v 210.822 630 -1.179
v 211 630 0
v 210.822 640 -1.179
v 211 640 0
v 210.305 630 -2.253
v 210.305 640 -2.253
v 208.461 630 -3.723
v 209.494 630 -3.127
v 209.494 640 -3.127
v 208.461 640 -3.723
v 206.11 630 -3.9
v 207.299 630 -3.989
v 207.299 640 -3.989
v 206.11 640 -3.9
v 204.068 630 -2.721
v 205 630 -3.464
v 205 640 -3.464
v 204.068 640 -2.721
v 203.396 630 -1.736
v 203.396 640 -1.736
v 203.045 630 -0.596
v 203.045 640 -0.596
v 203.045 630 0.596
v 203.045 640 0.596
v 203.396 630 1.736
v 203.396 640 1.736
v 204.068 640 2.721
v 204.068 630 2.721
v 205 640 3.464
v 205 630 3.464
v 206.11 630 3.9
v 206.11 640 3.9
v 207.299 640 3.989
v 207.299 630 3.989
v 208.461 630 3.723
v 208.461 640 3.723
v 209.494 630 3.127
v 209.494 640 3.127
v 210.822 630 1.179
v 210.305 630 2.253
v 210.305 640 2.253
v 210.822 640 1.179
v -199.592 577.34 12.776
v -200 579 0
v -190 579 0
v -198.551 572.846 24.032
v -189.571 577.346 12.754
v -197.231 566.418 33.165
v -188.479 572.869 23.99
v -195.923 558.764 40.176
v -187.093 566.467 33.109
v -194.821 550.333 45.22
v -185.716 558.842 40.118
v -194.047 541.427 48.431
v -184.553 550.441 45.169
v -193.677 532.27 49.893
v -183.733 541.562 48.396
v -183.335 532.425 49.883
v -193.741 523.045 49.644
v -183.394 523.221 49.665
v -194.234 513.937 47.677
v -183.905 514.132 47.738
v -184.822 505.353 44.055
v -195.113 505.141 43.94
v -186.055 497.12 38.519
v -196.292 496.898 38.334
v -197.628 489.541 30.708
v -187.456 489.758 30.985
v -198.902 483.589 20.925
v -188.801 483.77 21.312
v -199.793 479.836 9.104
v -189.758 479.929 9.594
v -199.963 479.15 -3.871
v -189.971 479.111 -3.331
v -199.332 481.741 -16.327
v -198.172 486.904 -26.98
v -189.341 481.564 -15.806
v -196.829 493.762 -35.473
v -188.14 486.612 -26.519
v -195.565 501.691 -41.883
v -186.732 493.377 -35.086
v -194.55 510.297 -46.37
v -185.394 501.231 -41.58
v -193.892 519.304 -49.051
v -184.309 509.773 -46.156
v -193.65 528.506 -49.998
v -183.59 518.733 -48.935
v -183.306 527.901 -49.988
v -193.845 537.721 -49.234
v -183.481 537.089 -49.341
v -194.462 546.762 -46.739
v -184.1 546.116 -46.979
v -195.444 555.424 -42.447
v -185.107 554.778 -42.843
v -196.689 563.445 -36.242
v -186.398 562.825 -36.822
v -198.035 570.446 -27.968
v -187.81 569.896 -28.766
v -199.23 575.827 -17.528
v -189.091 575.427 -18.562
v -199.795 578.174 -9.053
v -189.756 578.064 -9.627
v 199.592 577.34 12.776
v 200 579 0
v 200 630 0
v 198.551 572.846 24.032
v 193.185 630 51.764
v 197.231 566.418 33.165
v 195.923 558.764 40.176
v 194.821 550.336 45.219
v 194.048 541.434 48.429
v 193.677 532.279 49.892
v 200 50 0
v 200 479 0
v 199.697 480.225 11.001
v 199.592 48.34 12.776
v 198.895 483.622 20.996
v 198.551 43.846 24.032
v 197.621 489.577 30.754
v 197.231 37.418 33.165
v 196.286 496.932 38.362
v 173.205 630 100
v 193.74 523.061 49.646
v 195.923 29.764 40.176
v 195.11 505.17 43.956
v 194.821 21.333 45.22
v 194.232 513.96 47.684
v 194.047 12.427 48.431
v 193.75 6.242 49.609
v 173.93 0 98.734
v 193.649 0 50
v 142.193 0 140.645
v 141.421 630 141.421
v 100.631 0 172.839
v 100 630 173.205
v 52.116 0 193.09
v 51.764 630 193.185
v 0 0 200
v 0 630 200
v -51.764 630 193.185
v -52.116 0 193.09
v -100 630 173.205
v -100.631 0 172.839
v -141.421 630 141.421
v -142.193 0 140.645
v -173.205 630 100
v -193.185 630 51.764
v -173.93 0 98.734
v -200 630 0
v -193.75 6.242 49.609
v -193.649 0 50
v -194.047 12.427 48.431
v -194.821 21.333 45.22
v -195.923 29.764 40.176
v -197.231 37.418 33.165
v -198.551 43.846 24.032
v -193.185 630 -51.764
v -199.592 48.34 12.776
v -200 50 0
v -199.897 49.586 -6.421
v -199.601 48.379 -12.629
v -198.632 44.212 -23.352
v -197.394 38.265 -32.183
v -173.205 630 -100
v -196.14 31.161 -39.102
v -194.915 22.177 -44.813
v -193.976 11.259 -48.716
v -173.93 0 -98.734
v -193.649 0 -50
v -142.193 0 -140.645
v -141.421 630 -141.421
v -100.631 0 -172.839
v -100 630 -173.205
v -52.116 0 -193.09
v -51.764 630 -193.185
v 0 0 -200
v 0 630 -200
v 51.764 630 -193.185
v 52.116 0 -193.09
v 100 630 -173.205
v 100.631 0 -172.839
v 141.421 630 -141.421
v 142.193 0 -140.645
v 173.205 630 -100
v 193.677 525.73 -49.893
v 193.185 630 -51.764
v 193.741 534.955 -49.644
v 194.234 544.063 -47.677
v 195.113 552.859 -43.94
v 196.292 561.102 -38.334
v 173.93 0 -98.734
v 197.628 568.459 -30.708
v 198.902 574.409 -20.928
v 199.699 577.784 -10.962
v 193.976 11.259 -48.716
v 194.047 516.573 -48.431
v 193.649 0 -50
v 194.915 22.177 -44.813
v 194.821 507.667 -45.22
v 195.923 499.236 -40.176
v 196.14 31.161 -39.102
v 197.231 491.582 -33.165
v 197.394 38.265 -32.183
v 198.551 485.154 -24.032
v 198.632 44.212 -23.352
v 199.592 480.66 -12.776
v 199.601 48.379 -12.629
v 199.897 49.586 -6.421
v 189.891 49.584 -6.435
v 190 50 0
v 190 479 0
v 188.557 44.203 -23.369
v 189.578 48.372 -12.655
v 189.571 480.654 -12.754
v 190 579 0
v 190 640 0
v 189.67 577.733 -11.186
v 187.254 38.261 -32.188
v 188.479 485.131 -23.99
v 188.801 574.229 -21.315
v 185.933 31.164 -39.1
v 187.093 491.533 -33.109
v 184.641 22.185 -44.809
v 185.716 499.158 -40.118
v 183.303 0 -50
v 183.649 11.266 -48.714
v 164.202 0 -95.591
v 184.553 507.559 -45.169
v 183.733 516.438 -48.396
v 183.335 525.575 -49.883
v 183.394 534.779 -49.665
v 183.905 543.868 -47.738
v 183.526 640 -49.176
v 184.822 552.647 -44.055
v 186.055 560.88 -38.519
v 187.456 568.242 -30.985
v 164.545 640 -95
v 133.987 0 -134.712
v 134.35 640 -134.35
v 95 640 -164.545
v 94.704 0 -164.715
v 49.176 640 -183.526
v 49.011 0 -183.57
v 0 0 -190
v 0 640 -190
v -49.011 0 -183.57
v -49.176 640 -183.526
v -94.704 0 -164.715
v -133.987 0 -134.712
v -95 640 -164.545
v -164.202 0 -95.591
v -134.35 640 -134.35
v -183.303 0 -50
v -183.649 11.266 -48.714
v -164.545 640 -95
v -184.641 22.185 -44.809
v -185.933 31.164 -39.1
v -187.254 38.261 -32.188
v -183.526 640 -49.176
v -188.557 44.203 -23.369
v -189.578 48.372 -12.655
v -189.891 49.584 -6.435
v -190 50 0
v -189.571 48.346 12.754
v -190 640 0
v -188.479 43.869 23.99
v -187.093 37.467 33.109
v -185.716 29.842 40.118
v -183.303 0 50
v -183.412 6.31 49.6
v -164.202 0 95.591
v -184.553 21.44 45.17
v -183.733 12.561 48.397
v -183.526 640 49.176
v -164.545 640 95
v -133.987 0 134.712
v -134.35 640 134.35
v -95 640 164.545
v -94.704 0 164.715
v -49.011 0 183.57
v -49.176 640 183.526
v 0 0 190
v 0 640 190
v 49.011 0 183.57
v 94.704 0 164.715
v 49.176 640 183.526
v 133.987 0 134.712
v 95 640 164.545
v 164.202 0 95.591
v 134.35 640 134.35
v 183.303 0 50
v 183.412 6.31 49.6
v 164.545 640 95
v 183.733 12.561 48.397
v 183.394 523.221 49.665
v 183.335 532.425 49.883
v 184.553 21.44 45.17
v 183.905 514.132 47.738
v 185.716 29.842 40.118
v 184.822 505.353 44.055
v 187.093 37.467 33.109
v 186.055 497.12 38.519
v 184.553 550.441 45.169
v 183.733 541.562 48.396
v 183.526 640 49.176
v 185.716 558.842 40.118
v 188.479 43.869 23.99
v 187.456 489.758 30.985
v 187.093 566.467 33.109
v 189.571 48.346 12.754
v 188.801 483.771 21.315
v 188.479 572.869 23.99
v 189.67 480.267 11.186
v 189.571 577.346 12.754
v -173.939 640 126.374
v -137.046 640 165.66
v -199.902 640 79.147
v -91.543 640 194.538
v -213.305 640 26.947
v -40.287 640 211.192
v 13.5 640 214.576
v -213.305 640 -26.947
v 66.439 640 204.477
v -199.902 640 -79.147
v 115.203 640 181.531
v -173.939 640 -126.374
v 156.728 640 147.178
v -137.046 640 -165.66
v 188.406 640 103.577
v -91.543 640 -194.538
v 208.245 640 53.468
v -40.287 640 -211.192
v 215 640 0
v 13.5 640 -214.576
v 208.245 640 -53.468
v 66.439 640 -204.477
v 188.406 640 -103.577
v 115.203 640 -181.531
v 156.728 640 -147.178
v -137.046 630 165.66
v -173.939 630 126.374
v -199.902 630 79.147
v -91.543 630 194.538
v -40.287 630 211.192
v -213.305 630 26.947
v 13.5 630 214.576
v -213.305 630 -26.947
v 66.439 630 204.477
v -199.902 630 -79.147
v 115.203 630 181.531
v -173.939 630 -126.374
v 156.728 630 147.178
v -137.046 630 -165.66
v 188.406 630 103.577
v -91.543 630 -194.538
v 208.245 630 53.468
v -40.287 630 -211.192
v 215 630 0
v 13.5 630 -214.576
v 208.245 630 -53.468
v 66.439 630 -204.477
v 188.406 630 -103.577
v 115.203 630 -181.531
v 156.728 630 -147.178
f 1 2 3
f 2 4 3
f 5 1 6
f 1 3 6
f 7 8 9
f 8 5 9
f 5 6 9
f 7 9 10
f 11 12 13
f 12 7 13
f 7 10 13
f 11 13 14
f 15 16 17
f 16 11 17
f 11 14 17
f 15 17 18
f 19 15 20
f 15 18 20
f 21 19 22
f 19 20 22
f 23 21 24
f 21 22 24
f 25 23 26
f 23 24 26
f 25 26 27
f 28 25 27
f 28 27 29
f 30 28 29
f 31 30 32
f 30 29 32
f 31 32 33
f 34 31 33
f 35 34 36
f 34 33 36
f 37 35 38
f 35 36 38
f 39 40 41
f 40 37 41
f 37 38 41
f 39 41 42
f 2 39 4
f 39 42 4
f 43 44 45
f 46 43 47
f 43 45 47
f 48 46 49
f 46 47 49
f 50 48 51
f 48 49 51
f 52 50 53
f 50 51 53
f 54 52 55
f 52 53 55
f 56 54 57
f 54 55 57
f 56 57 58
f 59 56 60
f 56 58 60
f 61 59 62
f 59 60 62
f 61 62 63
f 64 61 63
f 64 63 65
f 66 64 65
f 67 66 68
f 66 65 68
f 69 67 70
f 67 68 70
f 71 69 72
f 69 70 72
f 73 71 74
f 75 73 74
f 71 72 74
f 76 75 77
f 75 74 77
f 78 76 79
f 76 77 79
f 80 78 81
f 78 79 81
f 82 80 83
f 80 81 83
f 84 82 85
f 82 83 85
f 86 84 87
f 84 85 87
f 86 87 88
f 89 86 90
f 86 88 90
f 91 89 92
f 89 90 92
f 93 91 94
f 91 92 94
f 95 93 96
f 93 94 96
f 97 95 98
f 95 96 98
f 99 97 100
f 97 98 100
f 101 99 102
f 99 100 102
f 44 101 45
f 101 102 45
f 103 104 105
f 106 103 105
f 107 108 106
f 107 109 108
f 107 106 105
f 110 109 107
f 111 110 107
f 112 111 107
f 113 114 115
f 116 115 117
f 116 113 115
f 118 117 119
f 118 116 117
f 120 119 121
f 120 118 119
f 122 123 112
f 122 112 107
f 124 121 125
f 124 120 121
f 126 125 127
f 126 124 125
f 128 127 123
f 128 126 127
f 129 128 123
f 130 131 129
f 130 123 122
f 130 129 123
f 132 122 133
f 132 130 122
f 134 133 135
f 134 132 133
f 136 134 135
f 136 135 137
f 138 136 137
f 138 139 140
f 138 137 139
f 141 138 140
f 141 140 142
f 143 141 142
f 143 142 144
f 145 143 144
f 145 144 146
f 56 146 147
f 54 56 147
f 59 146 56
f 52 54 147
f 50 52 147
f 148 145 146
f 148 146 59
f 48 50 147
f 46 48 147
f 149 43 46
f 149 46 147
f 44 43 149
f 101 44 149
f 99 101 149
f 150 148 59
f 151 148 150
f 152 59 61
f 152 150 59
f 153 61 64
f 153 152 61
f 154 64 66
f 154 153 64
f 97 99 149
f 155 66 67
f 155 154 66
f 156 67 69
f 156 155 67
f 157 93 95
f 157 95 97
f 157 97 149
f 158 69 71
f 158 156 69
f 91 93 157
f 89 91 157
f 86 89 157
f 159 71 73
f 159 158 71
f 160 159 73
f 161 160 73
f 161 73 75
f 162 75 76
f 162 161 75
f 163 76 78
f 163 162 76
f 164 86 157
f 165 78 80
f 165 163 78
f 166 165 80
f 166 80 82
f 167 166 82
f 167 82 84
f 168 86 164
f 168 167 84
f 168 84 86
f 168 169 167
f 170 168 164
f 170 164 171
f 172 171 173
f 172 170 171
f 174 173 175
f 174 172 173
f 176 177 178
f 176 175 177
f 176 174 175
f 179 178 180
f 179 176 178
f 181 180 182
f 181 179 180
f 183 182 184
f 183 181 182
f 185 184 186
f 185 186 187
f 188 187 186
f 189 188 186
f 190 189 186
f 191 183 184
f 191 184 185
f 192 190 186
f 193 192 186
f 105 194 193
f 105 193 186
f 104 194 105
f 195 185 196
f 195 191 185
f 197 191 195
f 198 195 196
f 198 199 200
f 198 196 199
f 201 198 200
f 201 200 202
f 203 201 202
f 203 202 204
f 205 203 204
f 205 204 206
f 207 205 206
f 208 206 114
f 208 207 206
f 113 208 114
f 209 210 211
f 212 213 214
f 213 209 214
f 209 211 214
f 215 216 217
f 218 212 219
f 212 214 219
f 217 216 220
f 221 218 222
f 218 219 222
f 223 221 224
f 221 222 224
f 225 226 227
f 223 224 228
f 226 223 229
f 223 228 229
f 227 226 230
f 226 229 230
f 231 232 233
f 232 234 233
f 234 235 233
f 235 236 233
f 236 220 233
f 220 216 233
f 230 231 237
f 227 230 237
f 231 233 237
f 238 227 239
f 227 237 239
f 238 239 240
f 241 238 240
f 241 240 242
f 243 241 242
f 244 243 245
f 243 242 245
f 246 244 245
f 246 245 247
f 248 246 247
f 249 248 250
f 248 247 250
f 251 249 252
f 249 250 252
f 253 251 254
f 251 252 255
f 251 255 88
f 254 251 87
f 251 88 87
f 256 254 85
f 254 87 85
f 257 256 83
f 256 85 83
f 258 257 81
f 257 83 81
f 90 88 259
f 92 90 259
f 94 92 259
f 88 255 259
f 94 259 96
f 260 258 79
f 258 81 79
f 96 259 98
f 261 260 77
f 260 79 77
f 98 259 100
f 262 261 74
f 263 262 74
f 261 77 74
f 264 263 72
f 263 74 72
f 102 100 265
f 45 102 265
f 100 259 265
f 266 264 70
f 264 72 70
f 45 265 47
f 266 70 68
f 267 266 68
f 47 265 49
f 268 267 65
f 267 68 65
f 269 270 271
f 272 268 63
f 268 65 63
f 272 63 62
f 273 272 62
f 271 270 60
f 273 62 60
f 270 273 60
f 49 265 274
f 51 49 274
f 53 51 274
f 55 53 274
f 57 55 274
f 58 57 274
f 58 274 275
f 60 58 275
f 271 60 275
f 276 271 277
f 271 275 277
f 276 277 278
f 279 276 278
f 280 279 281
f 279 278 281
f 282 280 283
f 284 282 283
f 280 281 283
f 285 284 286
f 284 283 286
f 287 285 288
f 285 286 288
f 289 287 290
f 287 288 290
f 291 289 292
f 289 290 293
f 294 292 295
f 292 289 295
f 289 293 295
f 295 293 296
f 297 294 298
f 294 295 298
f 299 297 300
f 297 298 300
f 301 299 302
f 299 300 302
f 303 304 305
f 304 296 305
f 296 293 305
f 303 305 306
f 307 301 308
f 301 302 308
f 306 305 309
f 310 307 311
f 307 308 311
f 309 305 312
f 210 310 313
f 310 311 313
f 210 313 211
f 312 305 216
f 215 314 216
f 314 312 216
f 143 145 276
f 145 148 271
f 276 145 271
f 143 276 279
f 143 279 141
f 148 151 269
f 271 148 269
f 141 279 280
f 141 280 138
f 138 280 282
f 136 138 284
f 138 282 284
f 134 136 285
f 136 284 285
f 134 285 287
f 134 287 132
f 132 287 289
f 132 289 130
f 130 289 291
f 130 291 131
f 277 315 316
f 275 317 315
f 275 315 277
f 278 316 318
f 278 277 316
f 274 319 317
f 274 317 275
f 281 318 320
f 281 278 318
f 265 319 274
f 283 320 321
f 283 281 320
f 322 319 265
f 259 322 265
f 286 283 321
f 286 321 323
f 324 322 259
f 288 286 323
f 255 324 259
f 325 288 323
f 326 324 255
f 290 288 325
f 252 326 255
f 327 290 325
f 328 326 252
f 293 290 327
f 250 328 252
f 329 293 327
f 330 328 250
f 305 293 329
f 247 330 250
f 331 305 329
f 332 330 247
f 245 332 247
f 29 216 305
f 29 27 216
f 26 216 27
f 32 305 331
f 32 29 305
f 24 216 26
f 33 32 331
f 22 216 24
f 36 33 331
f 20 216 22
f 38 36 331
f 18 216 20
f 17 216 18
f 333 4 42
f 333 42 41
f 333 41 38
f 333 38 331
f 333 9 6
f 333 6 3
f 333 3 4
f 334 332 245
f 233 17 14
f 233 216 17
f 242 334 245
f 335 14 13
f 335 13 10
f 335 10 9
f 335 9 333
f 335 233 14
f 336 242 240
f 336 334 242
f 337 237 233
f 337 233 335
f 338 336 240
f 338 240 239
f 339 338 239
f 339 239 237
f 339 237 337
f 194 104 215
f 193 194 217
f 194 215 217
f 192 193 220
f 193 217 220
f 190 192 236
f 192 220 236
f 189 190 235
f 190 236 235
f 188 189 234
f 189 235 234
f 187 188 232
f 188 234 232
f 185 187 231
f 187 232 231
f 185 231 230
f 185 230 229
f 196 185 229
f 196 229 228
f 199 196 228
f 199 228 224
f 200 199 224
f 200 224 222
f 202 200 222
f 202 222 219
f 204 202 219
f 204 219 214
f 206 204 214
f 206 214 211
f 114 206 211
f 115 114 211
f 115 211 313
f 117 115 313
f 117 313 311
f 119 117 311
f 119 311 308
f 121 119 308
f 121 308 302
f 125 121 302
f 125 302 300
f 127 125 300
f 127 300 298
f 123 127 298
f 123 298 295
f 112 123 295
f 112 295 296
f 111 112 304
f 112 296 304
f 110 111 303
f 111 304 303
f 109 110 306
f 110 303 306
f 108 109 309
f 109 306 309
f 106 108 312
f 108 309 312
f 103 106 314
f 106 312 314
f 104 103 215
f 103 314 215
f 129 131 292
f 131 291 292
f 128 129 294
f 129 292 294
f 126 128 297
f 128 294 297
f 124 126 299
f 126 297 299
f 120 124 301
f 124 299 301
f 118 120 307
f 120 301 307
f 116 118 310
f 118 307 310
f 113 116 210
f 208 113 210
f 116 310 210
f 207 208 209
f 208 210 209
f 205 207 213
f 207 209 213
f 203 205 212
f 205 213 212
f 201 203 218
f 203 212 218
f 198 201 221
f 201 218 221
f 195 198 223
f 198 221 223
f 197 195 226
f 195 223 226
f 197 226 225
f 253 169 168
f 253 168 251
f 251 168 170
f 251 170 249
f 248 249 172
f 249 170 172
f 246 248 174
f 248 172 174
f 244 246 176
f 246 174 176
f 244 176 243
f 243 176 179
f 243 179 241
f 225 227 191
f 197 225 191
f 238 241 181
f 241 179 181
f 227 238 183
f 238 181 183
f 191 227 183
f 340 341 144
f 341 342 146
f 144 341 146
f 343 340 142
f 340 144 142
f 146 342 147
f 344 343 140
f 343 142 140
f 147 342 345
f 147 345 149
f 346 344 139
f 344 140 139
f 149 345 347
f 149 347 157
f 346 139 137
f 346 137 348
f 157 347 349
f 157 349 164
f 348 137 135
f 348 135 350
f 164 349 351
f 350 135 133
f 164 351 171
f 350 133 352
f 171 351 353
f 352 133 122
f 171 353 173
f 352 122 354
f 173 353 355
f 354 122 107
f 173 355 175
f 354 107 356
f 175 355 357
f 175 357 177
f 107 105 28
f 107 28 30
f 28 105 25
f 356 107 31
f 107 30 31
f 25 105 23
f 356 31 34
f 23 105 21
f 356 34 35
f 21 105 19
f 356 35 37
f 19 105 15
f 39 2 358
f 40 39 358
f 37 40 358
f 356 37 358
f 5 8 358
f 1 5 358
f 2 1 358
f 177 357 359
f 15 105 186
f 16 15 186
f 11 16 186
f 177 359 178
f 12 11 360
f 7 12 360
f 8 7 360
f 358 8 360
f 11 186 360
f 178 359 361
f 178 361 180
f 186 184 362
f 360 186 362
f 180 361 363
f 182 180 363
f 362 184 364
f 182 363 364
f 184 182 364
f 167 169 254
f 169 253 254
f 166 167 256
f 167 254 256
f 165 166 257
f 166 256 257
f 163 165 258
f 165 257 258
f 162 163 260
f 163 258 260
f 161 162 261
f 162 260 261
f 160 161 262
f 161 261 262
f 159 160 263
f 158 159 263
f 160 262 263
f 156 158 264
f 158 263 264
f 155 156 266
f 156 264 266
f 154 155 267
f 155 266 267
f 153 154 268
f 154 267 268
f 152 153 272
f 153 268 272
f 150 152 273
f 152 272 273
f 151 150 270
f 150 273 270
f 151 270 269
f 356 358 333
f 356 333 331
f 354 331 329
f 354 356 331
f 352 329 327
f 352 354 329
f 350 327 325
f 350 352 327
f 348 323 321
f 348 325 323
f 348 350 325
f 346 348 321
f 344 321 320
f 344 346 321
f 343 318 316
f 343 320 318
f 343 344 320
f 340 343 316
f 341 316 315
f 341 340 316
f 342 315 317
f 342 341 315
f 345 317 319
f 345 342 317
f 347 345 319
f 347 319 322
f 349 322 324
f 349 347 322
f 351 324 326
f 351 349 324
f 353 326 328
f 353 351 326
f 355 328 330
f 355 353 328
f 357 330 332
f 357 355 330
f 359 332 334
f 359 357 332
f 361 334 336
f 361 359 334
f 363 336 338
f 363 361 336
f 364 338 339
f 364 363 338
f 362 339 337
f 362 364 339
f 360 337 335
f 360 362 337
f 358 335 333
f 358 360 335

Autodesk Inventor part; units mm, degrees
ref_plane "YZ Plane" through (0, 0, 0) normal (1, 0, 0) x (0, 1, 0)
ref_plane "XZ Plane" through (0, 0, 0) normal (0, 1, 0) x (-1, 0, 0)
ref_plane "XY Plane" through (0, 0, 0) normal (0, 0, 1) x (1, 0, 0)
sketch "Эскиз1" plane through (0, 0, 0) normal (0, 0, 1) x (1, 0, 0)
  line L0 (0, 0) -> (190, 0)
  line L1 (190, 0) -> (190, 640)
  line L2 (190, 640) -> (215, 640)
  line L3 (215, 640) -> (215, 630)
  line L4 (215, 630) -> (200, 630)
  line L5 (200, 630) -> (200, 0)
  line L6 (200, 0) -> (190, 0)
  line L7 (0, -128) -> (0, 768) projected
  dimension "d0" = 190
  dimension "d1" = 640
  dimension "d2" = 25
  dimension "d3" = 10
revolve "Вращение1" add sketch "Эскиз1" angle 360 about axis through (0, -10, 0) along (0, 1, 0)
sketch "Эскиз2" plane through (0, 640, 0) normal (0, 1, 0) x (1, 0, 0)
  circle A0 centre (207, 0) radius 4
  circle A1 centre (0, 0) radius 190 projected
  line L0 (190, 0) -> (207, 0)
  dimension "d6" = 8
  dimension "d19" = 17
extrude "Выдавливание1" cut sketch "Эскиз2" against normal through all contours A0
sketch "Эскиз3" plane through (0, 0, 0) normal (1, 0, 0) x (0, 1, 0)
  line L0 (630, 215) -> (630, -215) projected
  line L1 (630, 200) -> (630, -200) projected
  line L2 (630, 0) -> (529, 0)
  circle A0 centre (529, 0) radius 50
  line L3 (0, 0) -> (0, 0)
  circle A1 centre (0, 0) radius 50
  dimension "d11" = 101
  dimension "d12" = 100
  dimension "d17" = 0
  dimension "d18" = 100
extrude "Выдавливание2" cut sketch "Эскиз3" along normal through all both and the other way through all
properties part number "Втулка" material "Сталь, легированная"
